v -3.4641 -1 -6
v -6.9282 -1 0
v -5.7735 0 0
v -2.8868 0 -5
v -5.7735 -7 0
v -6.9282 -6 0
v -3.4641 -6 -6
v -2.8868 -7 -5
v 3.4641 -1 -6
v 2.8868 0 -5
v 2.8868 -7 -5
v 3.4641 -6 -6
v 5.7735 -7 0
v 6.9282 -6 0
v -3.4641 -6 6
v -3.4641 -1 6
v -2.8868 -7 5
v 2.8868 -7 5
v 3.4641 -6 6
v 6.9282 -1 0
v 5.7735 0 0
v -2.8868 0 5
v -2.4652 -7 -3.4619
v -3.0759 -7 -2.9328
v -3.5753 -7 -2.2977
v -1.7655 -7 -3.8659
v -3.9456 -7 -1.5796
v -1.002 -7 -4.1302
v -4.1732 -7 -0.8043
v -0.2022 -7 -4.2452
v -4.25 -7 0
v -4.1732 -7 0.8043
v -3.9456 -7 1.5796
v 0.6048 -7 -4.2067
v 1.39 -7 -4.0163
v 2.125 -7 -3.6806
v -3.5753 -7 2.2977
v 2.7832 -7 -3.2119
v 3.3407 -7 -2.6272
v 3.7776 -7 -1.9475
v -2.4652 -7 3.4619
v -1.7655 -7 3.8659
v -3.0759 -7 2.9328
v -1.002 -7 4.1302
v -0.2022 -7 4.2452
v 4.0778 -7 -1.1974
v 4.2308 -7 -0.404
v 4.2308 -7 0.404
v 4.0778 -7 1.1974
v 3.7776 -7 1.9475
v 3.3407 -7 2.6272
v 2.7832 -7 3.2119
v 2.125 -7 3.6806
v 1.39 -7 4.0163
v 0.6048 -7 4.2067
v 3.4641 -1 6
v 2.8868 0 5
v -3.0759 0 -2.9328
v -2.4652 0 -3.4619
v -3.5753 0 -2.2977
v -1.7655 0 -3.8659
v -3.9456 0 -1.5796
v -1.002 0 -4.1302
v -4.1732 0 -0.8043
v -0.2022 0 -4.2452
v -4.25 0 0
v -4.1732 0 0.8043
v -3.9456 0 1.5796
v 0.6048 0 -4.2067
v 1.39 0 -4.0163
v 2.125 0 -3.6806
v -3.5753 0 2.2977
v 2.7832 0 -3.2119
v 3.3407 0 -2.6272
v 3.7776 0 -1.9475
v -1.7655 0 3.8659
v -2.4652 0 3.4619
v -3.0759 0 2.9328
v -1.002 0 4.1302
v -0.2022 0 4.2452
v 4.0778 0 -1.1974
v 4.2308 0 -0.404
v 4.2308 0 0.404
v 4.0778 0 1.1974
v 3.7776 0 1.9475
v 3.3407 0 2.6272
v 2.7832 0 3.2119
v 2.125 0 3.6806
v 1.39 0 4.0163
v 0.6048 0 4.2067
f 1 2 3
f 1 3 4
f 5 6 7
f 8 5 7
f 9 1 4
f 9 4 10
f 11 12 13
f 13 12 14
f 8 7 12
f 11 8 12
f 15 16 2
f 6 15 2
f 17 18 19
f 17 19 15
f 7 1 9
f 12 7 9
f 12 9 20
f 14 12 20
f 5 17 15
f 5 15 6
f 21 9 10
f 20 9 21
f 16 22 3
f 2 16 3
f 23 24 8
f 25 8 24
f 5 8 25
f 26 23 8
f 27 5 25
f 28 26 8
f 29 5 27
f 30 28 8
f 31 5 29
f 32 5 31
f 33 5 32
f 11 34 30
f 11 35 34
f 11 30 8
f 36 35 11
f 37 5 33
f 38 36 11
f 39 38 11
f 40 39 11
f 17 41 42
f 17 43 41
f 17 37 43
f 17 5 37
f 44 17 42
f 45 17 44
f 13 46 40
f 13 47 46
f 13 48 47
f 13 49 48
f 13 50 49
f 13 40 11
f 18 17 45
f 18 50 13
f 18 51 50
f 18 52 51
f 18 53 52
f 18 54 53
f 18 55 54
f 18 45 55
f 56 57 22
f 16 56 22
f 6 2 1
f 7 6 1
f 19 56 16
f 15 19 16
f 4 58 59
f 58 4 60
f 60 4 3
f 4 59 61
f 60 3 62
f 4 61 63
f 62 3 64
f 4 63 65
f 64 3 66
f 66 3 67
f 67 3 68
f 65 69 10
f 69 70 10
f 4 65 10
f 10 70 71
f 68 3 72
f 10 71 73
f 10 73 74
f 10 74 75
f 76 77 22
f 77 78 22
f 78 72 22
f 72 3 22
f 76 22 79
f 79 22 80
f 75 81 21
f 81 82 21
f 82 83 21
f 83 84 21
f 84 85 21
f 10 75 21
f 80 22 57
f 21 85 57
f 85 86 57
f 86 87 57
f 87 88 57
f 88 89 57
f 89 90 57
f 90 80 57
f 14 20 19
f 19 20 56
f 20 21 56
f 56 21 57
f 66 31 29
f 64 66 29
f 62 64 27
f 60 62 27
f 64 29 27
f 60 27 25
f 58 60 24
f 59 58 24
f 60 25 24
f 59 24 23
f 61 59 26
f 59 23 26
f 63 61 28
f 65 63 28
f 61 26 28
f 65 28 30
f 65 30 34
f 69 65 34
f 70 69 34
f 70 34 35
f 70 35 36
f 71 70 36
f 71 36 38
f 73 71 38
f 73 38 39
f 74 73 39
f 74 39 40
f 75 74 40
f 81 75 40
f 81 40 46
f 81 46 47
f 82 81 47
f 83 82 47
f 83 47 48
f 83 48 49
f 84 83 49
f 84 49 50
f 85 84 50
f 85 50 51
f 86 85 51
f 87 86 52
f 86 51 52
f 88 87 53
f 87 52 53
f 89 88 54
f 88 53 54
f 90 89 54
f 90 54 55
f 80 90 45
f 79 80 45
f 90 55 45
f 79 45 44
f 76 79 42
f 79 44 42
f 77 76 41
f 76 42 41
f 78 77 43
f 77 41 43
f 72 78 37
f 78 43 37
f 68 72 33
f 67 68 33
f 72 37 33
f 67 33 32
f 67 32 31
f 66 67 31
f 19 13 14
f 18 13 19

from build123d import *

# Parameters (mm, degrees)
F1_DEPTH = 7
F2_D     = 8.5
F3_SIZE  = 1


with BuildPart() as f1:
    # F0 (on Front) → F1 (new body)
    with BuildSketch(Plane.XZ):
        Polygon((3.4641016151, 6), (-3.4641016151, 6), (-6.9282032303, 0), (-3.4641016151, -6), (3.4641016151, -6), (6.9282032303, 0), align=None)
    extrude(amount=F1_DEPTH)

    # F2 (through all)
    with Locations(Plane(origin=(0, 0, 0), x_dir=(1, 0, 0), z_dir=(0, 1, 0))):
        with Locations((0, 0)):
            Hole(F2_D / 2)

    # F3
    f3_edges = [f1.edges().sort_by_distance(p)[0] for p in [
        (0, -7, 6),
        (-5.196152, -7, 3),
        (-5.196152, -7, -3),
        (0, -7, -6),
        (5.196152, -7, -3),
        (5.196152, -7, 3),
        (5.196152, 0, 3),
        (0, 0, 6),
        (-5.196152, 0, 3),
        (-5.196152, 0, -3),
        (0, 0, -6),
        (5.196152, 0, -3),
    ]]
    chamfer(f3_edges, length=F3_SIZE)


solid = f1.part
